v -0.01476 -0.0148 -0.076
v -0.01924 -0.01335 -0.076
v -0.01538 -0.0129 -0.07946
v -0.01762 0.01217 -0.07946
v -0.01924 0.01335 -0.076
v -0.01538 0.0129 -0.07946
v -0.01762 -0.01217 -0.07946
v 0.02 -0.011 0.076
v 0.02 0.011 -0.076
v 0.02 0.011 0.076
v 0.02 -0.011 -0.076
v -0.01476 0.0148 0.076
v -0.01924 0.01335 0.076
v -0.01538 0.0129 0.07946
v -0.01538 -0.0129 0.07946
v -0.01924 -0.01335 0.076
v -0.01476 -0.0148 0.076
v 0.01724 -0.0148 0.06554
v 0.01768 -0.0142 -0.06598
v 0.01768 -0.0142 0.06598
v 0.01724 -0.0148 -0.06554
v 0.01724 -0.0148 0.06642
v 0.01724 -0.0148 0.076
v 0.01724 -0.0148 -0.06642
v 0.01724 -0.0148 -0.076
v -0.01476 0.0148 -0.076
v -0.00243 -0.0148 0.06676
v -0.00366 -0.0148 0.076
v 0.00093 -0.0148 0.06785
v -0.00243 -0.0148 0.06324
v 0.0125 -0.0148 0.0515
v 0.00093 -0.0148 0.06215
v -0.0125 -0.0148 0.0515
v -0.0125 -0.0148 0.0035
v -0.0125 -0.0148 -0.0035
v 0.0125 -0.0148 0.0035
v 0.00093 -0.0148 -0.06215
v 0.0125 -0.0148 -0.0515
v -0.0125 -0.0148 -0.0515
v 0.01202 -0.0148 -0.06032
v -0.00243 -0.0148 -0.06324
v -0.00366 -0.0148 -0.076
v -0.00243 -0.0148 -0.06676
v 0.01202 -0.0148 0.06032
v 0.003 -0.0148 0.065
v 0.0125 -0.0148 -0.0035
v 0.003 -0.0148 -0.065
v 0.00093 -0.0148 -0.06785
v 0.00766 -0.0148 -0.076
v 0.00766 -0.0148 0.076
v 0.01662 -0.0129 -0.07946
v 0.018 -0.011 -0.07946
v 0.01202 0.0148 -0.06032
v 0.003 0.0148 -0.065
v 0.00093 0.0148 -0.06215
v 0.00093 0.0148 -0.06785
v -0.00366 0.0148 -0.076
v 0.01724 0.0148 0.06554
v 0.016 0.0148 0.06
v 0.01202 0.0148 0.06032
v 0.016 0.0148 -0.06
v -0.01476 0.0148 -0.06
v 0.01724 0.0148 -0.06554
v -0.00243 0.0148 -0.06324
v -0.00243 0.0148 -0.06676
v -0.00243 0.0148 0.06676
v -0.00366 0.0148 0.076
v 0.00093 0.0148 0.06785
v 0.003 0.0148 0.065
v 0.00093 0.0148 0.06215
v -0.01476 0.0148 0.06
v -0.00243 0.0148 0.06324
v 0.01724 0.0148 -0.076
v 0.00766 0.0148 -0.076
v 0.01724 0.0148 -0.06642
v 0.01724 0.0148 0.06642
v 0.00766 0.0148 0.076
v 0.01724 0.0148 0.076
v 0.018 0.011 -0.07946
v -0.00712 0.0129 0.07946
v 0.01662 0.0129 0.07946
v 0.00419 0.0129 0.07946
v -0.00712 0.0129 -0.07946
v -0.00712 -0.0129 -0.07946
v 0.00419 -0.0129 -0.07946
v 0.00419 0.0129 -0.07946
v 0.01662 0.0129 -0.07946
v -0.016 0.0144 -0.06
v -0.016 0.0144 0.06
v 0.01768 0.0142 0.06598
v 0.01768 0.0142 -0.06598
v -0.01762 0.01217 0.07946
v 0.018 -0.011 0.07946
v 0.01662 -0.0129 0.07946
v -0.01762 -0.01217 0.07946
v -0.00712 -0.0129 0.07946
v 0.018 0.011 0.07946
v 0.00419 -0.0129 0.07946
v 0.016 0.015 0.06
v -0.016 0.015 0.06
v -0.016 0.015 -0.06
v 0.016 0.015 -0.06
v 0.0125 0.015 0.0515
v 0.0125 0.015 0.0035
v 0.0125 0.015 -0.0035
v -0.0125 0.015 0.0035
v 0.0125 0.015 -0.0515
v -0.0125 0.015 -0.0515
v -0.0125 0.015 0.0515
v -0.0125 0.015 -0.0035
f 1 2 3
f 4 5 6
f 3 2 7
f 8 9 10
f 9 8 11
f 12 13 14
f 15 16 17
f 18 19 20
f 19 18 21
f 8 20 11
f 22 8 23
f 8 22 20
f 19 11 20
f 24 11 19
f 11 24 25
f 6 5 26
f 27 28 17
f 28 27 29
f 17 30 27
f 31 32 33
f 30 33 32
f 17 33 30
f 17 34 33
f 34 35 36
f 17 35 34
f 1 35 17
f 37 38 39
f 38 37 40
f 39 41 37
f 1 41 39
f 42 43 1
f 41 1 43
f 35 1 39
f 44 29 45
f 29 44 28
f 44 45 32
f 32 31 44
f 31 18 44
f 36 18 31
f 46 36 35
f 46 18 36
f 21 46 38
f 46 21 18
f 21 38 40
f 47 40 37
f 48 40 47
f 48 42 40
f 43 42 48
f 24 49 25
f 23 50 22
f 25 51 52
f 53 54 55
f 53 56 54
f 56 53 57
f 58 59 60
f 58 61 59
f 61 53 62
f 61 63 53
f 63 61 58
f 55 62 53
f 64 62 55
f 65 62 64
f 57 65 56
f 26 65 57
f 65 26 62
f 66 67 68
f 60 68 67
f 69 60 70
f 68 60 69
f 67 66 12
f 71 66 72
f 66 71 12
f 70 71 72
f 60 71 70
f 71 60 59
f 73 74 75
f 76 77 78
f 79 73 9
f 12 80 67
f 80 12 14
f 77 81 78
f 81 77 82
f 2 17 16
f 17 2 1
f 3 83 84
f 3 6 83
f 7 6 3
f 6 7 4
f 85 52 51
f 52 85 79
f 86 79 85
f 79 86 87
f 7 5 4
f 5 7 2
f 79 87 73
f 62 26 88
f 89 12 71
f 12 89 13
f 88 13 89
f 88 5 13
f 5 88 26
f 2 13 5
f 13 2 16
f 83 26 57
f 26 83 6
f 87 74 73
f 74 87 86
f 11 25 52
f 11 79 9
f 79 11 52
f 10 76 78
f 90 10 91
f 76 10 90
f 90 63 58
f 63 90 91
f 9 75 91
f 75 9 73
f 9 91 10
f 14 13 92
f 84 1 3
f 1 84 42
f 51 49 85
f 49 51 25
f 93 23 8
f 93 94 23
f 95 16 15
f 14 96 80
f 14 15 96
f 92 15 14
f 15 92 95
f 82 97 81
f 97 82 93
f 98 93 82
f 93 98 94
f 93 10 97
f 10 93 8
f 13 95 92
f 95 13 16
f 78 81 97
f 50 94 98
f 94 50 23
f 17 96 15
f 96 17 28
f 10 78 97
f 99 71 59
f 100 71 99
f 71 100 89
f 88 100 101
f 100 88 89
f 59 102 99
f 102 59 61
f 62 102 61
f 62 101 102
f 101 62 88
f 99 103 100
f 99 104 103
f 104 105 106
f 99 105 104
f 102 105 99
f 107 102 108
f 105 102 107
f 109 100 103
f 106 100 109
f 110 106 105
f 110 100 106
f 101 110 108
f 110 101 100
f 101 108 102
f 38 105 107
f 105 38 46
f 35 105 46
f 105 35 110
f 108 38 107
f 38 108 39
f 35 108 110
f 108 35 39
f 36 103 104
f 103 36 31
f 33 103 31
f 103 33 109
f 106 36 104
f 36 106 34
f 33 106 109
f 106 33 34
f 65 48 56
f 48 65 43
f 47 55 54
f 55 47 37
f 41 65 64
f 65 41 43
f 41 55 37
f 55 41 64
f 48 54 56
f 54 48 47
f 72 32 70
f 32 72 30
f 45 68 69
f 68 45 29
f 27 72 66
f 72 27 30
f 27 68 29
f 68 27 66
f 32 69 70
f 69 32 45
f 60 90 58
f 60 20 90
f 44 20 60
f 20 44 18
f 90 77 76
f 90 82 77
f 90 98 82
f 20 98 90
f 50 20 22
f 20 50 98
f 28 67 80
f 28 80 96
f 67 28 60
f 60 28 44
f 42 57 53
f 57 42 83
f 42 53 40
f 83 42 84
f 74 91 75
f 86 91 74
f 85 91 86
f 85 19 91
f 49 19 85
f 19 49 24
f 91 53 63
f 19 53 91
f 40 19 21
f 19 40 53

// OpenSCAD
// Parameters
bbox_x = 0.04; //[0.02:0.08:0.001]
bbox_y = 0.03; //[0.015:0.06:0.001]
bbox_z = 0.16; //[0.08:0.32:0.001]
body_len = 0.16; //[0.08:0.32:0.001]
body_w = 0.04; //[0.02:0.08:0.001]
body_t = 0.03; //[0.015:0.06:0.001]
corner_r = 0.004; //[0.002:0.008:0.0005]
curve_sag = 0.004; //[0.0:0.008:0.0005]
reinforce_len = 0.05; //[0.025:0.1:0.001]
reinforce_w = 0.038; //[0.019:0.076:0.001]
reinforce_t = 0.03; //[0.015:0.06:0.001]
window_len = 0.045; //[0.0225:0.09:0.001]
window_w = 0.022; //[0.011:0.044:0.001]
window_t = 0.032; //[0.016:0.064:0.001]
window_gap = 0.01; //[0.005:0.02:0.001]
end_margin = 0.015; //[0.0075:0.03:0.001]
end_hole_d = 0.006; //[0.003:0.012:0.0005]
end_chamfer = 0.004; //[0.002:0.008:0.0005]
overlap = 0.001; //[0.0005:0.002:0.0005]
facet_z = 0.04; //[0.02:0.08:0.005]
bevel = 0.0015; //[0.0005:0.003:0.0005]

// Main strap body
module main_strap_body() {
  cube([body_w - 2*corner_r, body_t - 2*corner_r, body_len - 2*corner_r], center=true);
}

// Edge fillets sphere
module edge_fillets_sphere() {
  sphere(r=corner_r, center=true);
}

// Central thickened reinforcement
module central_thickened_reinforcement() {
  cube([reinforce_w - 2*corner_r, reinforce_t - 2*corner_r, reinforce_len - 2*corner_r], center=true);
}

// Window cutouts
module window_cutout_1() {
  translate([0, 0, -(window_gap/2 + window_len/2)])
    cube([window_w, window_t, window_len], center=true);
}

module window_cutout_2() {
  translate([0, 0, (window_gap/2 + window_len/2)])
    cube([window_w, window_t, window_len], center=true);
}

// Cosmetic bevels on windows
module cosmetic_bevels_on_windows_1() {
  translate([0, 0, -(window_gap/2 + window_len/2)])
    cube([window_w + 2*bevel, window_t + 2*bevel, window_len + 2*bevel], center=true);
}

module cosmetic_bevels_on_windows_2() {
  translate([0, 0, (window_gap/2 + window_len/2)])
    cube([window_w + 2*bevel, window_t + 2*bevel, window_len + 2*bevel], center=true);
}

// End holes
module end_hole_1() {
  translate([0, 0, -(body_len/2 - end_margin)])
    rotate([90, 0, 0])
      cylinder(r=end_hole_d/2, h=body_t + 2*overlap, center=true);
}

module end_hole_2() {
  translate([0, 0, (body_len/2 - end_margin)])
    rotate([90, 0, 0])
      cylinder(r=end_hole_d/2, h=body_t + 2*overlap, center=true);
}

// End chamfers or rounds
module end_chamfers_or_rounds_wedge_pos() {
  translate([0, 0, (body_len/2 - end_chamfer/2)])
    rotate([0, 45, 0])
      cube([body_w + 2*overlap, body_t + 2*overlap, end_chamfer*2], center=true);
}

module end_chamfers_or_rounds_wedge_neg() {
  translate([0, 0, -(body_len/2 - end_chamfer/2)])
    rotate([0, -45, 0])
      cube([body_w + 2*overlap, body_t + 2*overlap, end_chamfer*2], center=true);
}

// Midsection faceted steps
module midsection_faceted_steps_seg1() {
  translate([0, curve_sag, -facet_z])
    cube([body_w - 2*corner_r, body_t - 2*corner_r, facet_z], center=true);
}

module midsection_faceted_steps_seg2() {
  translate([0, curve_sag/2, 0])
    cube([body_w - 2*corner_r, body_t - 2*corner_r, facet_z], center=true);
}

module midsection_faceted_steps_seg3() {
  translate([0, curve_sag, facet_z])
    cube([body_w - 2*corner_r, body_t - 2*corner_r, facet_z], center=true);
}

// Main body with edge fillets
module main_body_with_edge_fillets() {
  minkowski() {
    main_strap_body();
    edge_fillets_sphere();
  }
}

// Reinforcement with edge fillets
module reinforcement_with_edge_fillets() {
  minkowski() {
    central_thickened_reinforcement();
    edge_fillets_sphere();
  }
}

// Overall curvature
module overall_curvature() {
  hull() {
    midsection_faceted_steps_seg1();
    midsection_faceted_steps_seg2();
    midsection_faceted_steps_seg3();
  }
}

// Final model
module final_model() {
  difference() {
    union() {
      union() {
        main_body_with_edge_fillets();
        overall_curvature();
      }
      reinforcement_with_edge_fillets();
    }
    window_cutout_1();
    window_cutout_2();
    cosmetic_bevels_on_windows_1();
    cosmetic_bevels_on_windows_2();
    end_hole_1();
    end_hole_2();
    end_chamfers_or_rounds_wedge_pos();
    end_chamfers_or_rounds_wedge_neg();
  }
}

// Render the final model
color("Silver") final_model();
